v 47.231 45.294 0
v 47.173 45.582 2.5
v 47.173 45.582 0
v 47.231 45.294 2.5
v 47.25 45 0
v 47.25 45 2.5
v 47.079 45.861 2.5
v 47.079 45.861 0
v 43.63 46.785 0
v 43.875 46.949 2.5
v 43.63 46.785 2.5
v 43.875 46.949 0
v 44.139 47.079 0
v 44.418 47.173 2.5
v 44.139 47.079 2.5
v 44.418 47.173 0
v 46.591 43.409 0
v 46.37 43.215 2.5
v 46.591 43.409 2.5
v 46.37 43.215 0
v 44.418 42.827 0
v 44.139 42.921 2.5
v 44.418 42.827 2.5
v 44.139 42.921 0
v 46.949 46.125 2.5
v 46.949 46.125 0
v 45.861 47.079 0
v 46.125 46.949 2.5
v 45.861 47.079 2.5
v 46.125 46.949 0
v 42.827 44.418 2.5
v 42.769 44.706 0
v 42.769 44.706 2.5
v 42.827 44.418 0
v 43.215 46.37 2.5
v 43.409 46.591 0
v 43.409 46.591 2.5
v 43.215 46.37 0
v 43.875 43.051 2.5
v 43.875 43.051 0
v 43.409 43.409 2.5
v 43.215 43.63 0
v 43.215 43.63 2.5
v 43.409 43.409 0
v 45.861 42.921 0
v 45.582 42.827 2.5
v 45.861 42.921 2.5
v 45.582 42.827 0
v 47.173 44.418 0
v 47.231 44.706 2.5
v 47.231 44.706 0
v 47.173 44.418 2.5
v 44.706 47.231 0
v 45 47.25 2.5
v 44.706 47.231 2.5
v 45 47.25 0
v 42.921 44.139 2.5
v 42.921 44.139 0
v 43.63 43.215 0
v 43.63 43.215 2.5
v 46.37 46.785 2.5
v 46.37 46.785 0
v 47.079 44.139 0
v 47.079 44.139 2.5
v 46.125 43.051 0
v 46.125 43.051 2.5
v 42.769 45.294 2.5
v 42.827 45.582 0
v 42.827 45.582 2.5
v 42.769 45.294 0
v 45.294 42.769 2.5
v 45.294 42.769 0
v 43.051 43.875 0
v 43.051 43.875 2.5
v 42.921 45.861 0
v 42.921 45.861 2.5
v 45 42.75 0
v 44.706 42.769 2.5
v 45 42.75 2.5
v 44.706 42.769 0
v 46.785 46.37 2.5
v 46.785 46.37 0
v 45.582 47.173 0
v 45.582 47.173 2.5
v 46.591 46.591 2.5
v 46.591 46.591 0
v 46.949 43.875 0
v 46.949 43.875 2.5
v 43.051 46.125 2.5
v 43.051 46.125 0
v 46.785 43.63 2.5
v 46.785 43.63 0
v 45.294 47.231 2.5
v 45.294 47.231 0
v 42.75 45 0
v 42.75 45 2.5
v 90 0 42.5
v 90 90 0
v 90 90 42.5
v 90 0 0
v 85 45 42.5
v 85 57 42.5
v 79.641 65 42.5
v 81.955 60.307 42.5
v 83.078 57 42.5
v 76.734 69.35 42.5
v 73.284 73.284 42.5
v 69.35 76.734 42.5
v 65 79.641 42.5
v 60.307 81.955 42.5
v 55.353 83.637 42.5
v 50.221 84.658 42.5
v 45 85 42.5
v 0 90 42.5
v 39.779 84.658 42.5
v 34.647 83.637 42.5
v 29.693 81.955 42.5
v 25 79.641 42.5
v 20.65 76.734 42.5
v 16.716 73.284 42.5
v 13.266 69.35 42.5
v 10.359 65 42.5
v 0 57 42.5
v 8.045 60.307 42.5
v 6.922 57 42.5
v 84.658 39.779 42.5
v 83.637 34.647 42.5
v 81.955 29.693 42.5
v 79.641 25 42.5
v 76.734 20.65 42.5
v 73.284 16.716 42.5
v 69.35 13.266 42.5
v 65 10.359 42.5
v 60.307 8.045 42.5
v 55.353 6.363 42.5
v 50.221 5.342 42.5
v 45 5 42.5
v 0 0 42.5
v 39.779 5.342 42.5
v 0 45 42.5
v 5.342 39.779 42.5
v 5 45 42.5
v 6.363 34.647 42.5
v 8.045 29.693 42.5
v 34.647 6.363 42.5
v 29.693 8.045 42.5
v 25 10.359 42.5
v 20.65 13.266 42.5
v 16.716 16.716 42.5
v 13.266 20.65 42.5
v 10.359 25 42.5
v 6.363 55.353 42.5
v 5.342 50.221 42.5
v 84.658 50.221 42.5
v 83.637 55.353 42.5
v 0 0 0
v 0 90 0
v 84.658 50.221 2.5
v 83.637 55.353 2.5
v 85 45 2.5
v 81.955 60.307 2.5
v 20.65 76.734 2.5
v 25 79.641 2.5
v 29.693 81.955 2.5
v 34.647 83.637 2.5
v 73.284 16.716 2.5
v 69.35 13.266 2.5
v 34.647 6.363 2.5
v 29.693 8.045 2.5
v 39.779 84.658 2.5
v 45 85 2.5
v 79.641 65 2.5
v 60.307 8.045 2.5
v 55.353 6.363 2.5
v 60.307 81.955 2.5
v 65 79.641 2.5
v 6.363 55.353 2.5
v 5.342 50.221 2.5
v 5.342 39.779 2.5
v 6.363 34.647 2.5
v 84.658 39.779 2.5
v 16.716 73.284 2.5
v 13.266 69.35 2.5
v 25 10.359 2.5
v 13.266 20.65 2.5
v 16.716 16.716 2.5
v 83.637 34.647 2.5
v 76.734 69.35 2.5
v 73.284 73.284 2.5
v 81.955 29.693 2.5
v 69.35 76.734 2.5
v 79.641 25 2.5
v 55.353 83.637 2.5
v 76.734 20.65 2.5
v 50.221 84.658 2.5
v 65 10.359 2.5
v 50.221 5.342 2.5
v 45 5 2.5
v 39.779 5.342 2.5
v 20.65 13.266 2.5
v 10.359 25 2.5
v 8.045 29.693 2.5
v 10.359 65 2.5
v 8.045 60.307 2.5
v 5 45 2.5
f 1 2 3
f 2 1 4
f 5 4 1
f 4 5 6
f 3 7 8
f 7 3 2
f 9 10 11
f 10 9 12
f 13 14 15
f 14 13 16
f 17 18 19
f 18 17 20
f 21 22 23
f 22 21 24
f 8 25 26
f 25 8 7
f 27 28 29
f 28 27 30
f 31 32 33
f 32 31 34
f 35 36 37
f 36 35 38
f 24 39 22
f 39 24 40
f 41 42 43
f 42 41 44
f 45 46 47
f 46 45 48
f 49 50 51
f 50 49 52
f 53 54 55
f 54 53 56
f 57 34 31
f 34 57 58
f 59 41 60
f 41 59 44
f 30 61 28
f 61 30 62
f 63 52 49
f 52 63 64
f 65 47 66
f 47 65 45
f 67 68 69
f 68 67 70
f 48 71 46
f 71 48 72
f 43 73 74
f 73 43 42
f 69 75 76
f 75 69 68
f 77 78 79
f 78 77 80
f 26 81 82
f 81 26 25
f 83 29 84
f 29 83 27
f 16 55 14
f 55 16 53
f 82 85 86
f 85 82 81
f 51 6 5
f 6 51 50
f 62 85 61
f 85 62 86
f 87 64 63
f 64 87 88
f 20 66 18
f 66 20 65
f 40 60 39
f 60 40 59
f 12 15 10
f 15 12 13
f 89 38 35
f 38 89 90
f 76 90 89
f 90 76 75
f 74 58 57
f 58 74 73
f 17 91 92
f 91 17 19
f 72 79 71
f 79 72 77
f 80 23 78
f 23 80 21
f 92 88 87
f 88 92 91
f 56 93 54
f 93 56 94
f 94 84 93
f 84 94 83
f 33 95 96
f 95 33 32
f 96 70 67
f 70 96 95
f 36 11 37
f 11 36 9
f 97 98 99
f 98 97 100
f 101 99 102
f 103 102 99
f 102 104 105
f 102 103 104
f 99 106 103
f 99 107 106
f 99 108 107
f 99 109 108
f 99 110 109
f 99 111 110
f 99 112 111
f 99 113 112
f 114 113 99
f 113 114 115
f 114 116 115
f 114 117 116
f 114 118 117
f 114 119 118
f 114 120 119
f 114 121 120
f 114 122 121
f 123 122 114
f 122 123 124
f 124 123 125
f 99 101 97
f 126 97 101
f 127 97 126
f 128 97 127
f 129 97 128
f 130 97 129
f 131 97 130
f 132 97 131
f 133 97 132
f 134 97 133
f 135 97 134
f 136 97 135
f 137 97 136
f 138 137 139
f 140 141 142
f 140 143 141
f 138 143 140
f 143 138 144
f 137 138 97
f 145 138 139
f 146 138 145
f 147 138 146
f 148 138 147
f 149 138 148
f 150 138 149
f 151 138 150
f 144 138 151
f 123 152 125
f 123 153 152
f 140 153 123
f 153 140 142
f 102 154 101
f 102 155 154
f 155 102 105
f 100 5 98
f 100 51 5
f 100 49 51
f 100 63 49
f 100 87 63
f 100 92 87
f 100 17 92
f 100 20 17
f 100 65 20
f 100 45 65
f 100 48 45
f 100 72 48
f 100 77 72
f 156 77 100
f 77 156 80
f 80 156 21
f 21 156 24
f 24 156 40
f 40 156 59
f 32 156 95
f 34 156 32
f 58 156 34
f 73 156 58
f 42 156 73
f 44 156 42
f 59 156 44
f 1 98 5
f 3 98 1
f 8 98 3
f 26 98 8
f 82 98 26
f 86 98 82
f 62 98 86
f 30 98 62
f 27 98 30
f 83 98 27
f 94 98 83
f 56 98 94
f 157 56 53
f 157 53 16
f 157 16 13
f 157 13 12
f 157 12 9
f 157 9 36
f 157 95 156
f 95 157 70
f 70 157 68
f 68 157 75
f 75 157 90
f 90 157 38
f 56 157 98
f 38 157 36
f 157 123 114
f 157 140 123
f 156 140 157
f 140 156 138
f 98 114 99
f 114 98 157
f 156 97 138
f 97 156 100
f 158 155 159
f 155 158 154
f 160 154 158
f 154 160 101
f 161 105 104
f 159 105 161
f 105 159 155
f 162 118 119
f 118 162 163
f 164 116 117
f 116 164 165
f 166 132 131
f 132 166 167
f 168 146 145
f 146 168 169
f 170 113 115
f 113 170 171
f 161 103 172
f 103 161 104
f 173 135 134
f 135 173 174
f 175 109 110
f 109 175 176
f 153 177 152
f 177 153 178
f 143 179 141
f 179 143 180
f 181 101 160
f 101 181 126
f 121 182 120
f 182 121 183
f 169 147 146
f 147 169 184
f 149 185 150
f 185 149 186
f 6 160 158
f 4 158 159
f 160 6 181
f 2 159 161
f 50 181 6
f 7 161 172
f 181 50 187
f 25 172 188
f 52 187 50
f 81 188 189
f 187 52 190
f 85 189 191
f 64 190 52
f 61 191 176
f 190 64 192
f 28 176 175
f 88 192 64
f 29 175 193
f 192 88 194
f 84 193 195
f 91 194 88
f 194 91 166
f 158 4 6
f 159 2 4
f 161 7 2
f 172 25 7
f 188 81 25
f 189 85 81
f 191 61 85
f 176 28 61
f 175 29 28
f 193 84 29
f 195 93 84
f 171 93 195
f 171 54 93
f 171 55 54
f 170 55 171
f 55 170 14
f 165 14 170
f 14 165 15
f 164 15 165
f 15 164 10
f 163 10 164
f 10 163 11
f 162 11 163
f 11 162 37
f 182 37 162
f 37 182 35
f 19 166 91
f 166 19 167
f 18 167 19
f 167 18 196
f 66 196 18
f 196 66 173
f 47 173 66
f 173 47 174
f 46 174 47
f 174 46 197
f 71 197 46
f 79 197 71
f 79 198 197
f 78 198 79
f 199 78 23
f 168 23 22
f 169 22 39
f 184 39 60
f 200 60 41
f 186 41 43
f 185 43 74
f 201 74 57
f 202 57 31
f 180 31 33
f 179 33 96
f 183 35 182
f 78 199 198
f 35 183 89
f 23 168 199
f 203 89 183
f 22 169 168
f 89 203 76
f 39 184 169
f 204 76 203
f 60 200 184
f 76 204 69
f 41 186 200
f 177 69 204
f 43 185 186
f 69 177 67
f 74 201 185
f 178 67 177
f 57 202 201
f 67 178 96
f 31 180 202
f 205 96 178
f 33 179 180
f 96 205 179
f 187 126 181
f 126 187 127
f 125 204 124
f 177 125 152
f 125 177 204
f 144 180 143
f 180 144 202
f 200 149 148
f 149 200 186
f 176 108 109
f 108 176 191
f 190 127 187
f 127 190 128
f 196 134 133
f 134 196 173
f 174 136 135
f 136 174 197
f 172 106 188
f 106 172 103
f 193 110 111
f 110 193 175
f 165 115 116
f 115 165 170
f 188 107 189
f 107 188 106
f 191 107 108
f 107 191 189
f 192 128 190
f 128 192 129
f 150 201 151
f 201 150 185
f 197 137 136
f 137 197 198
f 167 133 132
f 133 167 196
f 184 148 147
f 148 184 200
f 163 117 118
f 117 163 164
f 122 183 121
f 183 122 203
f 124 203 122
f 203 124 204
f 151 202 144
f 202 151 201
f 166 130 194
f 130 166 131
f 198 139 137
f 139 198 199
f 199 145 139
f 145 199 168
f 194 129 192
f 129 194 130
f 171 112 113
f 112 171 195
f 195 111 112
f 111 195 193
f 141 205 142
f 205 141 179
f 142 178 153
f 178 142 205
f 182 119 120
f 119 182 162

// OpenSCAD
// Fan box - a box open at the top, to cover a round fan and provide a stirring surface. NOVEL
// part: a cable notch in one wall helps route the fan's power cord.
//

top     = 2;
walls   = 2.5;
open_z  = 40;
inner   = 80;
outer   = 90;
screw   = 4.5;
screw_p = 71.5;
notch_w = 12;
notch_d = 8;

$fn = 48;

size = outer;

difference() {
    cube([size, size, open_z + walls]);
    translate([size / 2, size / 2, walls]) cylinder(h = open_z + 1, d = inner);   // inner space
    for (x = [-size / 2, size / 2])
        for (y = [-size / 2, size / 2])
            translate([x, y, -1]) cylinder(h = open_z + 2, d = screw);               // screw holes
    translate([size / 2, size / 2, open_z + walls]) cylinder(h = open_z + 2, d = screw_p);  // fan centre
    d = size - 2 * walls;
    translate([0, size / 2, open_z + walls]) cube([d, notch_w, notch_d]);           // cable notch
}
